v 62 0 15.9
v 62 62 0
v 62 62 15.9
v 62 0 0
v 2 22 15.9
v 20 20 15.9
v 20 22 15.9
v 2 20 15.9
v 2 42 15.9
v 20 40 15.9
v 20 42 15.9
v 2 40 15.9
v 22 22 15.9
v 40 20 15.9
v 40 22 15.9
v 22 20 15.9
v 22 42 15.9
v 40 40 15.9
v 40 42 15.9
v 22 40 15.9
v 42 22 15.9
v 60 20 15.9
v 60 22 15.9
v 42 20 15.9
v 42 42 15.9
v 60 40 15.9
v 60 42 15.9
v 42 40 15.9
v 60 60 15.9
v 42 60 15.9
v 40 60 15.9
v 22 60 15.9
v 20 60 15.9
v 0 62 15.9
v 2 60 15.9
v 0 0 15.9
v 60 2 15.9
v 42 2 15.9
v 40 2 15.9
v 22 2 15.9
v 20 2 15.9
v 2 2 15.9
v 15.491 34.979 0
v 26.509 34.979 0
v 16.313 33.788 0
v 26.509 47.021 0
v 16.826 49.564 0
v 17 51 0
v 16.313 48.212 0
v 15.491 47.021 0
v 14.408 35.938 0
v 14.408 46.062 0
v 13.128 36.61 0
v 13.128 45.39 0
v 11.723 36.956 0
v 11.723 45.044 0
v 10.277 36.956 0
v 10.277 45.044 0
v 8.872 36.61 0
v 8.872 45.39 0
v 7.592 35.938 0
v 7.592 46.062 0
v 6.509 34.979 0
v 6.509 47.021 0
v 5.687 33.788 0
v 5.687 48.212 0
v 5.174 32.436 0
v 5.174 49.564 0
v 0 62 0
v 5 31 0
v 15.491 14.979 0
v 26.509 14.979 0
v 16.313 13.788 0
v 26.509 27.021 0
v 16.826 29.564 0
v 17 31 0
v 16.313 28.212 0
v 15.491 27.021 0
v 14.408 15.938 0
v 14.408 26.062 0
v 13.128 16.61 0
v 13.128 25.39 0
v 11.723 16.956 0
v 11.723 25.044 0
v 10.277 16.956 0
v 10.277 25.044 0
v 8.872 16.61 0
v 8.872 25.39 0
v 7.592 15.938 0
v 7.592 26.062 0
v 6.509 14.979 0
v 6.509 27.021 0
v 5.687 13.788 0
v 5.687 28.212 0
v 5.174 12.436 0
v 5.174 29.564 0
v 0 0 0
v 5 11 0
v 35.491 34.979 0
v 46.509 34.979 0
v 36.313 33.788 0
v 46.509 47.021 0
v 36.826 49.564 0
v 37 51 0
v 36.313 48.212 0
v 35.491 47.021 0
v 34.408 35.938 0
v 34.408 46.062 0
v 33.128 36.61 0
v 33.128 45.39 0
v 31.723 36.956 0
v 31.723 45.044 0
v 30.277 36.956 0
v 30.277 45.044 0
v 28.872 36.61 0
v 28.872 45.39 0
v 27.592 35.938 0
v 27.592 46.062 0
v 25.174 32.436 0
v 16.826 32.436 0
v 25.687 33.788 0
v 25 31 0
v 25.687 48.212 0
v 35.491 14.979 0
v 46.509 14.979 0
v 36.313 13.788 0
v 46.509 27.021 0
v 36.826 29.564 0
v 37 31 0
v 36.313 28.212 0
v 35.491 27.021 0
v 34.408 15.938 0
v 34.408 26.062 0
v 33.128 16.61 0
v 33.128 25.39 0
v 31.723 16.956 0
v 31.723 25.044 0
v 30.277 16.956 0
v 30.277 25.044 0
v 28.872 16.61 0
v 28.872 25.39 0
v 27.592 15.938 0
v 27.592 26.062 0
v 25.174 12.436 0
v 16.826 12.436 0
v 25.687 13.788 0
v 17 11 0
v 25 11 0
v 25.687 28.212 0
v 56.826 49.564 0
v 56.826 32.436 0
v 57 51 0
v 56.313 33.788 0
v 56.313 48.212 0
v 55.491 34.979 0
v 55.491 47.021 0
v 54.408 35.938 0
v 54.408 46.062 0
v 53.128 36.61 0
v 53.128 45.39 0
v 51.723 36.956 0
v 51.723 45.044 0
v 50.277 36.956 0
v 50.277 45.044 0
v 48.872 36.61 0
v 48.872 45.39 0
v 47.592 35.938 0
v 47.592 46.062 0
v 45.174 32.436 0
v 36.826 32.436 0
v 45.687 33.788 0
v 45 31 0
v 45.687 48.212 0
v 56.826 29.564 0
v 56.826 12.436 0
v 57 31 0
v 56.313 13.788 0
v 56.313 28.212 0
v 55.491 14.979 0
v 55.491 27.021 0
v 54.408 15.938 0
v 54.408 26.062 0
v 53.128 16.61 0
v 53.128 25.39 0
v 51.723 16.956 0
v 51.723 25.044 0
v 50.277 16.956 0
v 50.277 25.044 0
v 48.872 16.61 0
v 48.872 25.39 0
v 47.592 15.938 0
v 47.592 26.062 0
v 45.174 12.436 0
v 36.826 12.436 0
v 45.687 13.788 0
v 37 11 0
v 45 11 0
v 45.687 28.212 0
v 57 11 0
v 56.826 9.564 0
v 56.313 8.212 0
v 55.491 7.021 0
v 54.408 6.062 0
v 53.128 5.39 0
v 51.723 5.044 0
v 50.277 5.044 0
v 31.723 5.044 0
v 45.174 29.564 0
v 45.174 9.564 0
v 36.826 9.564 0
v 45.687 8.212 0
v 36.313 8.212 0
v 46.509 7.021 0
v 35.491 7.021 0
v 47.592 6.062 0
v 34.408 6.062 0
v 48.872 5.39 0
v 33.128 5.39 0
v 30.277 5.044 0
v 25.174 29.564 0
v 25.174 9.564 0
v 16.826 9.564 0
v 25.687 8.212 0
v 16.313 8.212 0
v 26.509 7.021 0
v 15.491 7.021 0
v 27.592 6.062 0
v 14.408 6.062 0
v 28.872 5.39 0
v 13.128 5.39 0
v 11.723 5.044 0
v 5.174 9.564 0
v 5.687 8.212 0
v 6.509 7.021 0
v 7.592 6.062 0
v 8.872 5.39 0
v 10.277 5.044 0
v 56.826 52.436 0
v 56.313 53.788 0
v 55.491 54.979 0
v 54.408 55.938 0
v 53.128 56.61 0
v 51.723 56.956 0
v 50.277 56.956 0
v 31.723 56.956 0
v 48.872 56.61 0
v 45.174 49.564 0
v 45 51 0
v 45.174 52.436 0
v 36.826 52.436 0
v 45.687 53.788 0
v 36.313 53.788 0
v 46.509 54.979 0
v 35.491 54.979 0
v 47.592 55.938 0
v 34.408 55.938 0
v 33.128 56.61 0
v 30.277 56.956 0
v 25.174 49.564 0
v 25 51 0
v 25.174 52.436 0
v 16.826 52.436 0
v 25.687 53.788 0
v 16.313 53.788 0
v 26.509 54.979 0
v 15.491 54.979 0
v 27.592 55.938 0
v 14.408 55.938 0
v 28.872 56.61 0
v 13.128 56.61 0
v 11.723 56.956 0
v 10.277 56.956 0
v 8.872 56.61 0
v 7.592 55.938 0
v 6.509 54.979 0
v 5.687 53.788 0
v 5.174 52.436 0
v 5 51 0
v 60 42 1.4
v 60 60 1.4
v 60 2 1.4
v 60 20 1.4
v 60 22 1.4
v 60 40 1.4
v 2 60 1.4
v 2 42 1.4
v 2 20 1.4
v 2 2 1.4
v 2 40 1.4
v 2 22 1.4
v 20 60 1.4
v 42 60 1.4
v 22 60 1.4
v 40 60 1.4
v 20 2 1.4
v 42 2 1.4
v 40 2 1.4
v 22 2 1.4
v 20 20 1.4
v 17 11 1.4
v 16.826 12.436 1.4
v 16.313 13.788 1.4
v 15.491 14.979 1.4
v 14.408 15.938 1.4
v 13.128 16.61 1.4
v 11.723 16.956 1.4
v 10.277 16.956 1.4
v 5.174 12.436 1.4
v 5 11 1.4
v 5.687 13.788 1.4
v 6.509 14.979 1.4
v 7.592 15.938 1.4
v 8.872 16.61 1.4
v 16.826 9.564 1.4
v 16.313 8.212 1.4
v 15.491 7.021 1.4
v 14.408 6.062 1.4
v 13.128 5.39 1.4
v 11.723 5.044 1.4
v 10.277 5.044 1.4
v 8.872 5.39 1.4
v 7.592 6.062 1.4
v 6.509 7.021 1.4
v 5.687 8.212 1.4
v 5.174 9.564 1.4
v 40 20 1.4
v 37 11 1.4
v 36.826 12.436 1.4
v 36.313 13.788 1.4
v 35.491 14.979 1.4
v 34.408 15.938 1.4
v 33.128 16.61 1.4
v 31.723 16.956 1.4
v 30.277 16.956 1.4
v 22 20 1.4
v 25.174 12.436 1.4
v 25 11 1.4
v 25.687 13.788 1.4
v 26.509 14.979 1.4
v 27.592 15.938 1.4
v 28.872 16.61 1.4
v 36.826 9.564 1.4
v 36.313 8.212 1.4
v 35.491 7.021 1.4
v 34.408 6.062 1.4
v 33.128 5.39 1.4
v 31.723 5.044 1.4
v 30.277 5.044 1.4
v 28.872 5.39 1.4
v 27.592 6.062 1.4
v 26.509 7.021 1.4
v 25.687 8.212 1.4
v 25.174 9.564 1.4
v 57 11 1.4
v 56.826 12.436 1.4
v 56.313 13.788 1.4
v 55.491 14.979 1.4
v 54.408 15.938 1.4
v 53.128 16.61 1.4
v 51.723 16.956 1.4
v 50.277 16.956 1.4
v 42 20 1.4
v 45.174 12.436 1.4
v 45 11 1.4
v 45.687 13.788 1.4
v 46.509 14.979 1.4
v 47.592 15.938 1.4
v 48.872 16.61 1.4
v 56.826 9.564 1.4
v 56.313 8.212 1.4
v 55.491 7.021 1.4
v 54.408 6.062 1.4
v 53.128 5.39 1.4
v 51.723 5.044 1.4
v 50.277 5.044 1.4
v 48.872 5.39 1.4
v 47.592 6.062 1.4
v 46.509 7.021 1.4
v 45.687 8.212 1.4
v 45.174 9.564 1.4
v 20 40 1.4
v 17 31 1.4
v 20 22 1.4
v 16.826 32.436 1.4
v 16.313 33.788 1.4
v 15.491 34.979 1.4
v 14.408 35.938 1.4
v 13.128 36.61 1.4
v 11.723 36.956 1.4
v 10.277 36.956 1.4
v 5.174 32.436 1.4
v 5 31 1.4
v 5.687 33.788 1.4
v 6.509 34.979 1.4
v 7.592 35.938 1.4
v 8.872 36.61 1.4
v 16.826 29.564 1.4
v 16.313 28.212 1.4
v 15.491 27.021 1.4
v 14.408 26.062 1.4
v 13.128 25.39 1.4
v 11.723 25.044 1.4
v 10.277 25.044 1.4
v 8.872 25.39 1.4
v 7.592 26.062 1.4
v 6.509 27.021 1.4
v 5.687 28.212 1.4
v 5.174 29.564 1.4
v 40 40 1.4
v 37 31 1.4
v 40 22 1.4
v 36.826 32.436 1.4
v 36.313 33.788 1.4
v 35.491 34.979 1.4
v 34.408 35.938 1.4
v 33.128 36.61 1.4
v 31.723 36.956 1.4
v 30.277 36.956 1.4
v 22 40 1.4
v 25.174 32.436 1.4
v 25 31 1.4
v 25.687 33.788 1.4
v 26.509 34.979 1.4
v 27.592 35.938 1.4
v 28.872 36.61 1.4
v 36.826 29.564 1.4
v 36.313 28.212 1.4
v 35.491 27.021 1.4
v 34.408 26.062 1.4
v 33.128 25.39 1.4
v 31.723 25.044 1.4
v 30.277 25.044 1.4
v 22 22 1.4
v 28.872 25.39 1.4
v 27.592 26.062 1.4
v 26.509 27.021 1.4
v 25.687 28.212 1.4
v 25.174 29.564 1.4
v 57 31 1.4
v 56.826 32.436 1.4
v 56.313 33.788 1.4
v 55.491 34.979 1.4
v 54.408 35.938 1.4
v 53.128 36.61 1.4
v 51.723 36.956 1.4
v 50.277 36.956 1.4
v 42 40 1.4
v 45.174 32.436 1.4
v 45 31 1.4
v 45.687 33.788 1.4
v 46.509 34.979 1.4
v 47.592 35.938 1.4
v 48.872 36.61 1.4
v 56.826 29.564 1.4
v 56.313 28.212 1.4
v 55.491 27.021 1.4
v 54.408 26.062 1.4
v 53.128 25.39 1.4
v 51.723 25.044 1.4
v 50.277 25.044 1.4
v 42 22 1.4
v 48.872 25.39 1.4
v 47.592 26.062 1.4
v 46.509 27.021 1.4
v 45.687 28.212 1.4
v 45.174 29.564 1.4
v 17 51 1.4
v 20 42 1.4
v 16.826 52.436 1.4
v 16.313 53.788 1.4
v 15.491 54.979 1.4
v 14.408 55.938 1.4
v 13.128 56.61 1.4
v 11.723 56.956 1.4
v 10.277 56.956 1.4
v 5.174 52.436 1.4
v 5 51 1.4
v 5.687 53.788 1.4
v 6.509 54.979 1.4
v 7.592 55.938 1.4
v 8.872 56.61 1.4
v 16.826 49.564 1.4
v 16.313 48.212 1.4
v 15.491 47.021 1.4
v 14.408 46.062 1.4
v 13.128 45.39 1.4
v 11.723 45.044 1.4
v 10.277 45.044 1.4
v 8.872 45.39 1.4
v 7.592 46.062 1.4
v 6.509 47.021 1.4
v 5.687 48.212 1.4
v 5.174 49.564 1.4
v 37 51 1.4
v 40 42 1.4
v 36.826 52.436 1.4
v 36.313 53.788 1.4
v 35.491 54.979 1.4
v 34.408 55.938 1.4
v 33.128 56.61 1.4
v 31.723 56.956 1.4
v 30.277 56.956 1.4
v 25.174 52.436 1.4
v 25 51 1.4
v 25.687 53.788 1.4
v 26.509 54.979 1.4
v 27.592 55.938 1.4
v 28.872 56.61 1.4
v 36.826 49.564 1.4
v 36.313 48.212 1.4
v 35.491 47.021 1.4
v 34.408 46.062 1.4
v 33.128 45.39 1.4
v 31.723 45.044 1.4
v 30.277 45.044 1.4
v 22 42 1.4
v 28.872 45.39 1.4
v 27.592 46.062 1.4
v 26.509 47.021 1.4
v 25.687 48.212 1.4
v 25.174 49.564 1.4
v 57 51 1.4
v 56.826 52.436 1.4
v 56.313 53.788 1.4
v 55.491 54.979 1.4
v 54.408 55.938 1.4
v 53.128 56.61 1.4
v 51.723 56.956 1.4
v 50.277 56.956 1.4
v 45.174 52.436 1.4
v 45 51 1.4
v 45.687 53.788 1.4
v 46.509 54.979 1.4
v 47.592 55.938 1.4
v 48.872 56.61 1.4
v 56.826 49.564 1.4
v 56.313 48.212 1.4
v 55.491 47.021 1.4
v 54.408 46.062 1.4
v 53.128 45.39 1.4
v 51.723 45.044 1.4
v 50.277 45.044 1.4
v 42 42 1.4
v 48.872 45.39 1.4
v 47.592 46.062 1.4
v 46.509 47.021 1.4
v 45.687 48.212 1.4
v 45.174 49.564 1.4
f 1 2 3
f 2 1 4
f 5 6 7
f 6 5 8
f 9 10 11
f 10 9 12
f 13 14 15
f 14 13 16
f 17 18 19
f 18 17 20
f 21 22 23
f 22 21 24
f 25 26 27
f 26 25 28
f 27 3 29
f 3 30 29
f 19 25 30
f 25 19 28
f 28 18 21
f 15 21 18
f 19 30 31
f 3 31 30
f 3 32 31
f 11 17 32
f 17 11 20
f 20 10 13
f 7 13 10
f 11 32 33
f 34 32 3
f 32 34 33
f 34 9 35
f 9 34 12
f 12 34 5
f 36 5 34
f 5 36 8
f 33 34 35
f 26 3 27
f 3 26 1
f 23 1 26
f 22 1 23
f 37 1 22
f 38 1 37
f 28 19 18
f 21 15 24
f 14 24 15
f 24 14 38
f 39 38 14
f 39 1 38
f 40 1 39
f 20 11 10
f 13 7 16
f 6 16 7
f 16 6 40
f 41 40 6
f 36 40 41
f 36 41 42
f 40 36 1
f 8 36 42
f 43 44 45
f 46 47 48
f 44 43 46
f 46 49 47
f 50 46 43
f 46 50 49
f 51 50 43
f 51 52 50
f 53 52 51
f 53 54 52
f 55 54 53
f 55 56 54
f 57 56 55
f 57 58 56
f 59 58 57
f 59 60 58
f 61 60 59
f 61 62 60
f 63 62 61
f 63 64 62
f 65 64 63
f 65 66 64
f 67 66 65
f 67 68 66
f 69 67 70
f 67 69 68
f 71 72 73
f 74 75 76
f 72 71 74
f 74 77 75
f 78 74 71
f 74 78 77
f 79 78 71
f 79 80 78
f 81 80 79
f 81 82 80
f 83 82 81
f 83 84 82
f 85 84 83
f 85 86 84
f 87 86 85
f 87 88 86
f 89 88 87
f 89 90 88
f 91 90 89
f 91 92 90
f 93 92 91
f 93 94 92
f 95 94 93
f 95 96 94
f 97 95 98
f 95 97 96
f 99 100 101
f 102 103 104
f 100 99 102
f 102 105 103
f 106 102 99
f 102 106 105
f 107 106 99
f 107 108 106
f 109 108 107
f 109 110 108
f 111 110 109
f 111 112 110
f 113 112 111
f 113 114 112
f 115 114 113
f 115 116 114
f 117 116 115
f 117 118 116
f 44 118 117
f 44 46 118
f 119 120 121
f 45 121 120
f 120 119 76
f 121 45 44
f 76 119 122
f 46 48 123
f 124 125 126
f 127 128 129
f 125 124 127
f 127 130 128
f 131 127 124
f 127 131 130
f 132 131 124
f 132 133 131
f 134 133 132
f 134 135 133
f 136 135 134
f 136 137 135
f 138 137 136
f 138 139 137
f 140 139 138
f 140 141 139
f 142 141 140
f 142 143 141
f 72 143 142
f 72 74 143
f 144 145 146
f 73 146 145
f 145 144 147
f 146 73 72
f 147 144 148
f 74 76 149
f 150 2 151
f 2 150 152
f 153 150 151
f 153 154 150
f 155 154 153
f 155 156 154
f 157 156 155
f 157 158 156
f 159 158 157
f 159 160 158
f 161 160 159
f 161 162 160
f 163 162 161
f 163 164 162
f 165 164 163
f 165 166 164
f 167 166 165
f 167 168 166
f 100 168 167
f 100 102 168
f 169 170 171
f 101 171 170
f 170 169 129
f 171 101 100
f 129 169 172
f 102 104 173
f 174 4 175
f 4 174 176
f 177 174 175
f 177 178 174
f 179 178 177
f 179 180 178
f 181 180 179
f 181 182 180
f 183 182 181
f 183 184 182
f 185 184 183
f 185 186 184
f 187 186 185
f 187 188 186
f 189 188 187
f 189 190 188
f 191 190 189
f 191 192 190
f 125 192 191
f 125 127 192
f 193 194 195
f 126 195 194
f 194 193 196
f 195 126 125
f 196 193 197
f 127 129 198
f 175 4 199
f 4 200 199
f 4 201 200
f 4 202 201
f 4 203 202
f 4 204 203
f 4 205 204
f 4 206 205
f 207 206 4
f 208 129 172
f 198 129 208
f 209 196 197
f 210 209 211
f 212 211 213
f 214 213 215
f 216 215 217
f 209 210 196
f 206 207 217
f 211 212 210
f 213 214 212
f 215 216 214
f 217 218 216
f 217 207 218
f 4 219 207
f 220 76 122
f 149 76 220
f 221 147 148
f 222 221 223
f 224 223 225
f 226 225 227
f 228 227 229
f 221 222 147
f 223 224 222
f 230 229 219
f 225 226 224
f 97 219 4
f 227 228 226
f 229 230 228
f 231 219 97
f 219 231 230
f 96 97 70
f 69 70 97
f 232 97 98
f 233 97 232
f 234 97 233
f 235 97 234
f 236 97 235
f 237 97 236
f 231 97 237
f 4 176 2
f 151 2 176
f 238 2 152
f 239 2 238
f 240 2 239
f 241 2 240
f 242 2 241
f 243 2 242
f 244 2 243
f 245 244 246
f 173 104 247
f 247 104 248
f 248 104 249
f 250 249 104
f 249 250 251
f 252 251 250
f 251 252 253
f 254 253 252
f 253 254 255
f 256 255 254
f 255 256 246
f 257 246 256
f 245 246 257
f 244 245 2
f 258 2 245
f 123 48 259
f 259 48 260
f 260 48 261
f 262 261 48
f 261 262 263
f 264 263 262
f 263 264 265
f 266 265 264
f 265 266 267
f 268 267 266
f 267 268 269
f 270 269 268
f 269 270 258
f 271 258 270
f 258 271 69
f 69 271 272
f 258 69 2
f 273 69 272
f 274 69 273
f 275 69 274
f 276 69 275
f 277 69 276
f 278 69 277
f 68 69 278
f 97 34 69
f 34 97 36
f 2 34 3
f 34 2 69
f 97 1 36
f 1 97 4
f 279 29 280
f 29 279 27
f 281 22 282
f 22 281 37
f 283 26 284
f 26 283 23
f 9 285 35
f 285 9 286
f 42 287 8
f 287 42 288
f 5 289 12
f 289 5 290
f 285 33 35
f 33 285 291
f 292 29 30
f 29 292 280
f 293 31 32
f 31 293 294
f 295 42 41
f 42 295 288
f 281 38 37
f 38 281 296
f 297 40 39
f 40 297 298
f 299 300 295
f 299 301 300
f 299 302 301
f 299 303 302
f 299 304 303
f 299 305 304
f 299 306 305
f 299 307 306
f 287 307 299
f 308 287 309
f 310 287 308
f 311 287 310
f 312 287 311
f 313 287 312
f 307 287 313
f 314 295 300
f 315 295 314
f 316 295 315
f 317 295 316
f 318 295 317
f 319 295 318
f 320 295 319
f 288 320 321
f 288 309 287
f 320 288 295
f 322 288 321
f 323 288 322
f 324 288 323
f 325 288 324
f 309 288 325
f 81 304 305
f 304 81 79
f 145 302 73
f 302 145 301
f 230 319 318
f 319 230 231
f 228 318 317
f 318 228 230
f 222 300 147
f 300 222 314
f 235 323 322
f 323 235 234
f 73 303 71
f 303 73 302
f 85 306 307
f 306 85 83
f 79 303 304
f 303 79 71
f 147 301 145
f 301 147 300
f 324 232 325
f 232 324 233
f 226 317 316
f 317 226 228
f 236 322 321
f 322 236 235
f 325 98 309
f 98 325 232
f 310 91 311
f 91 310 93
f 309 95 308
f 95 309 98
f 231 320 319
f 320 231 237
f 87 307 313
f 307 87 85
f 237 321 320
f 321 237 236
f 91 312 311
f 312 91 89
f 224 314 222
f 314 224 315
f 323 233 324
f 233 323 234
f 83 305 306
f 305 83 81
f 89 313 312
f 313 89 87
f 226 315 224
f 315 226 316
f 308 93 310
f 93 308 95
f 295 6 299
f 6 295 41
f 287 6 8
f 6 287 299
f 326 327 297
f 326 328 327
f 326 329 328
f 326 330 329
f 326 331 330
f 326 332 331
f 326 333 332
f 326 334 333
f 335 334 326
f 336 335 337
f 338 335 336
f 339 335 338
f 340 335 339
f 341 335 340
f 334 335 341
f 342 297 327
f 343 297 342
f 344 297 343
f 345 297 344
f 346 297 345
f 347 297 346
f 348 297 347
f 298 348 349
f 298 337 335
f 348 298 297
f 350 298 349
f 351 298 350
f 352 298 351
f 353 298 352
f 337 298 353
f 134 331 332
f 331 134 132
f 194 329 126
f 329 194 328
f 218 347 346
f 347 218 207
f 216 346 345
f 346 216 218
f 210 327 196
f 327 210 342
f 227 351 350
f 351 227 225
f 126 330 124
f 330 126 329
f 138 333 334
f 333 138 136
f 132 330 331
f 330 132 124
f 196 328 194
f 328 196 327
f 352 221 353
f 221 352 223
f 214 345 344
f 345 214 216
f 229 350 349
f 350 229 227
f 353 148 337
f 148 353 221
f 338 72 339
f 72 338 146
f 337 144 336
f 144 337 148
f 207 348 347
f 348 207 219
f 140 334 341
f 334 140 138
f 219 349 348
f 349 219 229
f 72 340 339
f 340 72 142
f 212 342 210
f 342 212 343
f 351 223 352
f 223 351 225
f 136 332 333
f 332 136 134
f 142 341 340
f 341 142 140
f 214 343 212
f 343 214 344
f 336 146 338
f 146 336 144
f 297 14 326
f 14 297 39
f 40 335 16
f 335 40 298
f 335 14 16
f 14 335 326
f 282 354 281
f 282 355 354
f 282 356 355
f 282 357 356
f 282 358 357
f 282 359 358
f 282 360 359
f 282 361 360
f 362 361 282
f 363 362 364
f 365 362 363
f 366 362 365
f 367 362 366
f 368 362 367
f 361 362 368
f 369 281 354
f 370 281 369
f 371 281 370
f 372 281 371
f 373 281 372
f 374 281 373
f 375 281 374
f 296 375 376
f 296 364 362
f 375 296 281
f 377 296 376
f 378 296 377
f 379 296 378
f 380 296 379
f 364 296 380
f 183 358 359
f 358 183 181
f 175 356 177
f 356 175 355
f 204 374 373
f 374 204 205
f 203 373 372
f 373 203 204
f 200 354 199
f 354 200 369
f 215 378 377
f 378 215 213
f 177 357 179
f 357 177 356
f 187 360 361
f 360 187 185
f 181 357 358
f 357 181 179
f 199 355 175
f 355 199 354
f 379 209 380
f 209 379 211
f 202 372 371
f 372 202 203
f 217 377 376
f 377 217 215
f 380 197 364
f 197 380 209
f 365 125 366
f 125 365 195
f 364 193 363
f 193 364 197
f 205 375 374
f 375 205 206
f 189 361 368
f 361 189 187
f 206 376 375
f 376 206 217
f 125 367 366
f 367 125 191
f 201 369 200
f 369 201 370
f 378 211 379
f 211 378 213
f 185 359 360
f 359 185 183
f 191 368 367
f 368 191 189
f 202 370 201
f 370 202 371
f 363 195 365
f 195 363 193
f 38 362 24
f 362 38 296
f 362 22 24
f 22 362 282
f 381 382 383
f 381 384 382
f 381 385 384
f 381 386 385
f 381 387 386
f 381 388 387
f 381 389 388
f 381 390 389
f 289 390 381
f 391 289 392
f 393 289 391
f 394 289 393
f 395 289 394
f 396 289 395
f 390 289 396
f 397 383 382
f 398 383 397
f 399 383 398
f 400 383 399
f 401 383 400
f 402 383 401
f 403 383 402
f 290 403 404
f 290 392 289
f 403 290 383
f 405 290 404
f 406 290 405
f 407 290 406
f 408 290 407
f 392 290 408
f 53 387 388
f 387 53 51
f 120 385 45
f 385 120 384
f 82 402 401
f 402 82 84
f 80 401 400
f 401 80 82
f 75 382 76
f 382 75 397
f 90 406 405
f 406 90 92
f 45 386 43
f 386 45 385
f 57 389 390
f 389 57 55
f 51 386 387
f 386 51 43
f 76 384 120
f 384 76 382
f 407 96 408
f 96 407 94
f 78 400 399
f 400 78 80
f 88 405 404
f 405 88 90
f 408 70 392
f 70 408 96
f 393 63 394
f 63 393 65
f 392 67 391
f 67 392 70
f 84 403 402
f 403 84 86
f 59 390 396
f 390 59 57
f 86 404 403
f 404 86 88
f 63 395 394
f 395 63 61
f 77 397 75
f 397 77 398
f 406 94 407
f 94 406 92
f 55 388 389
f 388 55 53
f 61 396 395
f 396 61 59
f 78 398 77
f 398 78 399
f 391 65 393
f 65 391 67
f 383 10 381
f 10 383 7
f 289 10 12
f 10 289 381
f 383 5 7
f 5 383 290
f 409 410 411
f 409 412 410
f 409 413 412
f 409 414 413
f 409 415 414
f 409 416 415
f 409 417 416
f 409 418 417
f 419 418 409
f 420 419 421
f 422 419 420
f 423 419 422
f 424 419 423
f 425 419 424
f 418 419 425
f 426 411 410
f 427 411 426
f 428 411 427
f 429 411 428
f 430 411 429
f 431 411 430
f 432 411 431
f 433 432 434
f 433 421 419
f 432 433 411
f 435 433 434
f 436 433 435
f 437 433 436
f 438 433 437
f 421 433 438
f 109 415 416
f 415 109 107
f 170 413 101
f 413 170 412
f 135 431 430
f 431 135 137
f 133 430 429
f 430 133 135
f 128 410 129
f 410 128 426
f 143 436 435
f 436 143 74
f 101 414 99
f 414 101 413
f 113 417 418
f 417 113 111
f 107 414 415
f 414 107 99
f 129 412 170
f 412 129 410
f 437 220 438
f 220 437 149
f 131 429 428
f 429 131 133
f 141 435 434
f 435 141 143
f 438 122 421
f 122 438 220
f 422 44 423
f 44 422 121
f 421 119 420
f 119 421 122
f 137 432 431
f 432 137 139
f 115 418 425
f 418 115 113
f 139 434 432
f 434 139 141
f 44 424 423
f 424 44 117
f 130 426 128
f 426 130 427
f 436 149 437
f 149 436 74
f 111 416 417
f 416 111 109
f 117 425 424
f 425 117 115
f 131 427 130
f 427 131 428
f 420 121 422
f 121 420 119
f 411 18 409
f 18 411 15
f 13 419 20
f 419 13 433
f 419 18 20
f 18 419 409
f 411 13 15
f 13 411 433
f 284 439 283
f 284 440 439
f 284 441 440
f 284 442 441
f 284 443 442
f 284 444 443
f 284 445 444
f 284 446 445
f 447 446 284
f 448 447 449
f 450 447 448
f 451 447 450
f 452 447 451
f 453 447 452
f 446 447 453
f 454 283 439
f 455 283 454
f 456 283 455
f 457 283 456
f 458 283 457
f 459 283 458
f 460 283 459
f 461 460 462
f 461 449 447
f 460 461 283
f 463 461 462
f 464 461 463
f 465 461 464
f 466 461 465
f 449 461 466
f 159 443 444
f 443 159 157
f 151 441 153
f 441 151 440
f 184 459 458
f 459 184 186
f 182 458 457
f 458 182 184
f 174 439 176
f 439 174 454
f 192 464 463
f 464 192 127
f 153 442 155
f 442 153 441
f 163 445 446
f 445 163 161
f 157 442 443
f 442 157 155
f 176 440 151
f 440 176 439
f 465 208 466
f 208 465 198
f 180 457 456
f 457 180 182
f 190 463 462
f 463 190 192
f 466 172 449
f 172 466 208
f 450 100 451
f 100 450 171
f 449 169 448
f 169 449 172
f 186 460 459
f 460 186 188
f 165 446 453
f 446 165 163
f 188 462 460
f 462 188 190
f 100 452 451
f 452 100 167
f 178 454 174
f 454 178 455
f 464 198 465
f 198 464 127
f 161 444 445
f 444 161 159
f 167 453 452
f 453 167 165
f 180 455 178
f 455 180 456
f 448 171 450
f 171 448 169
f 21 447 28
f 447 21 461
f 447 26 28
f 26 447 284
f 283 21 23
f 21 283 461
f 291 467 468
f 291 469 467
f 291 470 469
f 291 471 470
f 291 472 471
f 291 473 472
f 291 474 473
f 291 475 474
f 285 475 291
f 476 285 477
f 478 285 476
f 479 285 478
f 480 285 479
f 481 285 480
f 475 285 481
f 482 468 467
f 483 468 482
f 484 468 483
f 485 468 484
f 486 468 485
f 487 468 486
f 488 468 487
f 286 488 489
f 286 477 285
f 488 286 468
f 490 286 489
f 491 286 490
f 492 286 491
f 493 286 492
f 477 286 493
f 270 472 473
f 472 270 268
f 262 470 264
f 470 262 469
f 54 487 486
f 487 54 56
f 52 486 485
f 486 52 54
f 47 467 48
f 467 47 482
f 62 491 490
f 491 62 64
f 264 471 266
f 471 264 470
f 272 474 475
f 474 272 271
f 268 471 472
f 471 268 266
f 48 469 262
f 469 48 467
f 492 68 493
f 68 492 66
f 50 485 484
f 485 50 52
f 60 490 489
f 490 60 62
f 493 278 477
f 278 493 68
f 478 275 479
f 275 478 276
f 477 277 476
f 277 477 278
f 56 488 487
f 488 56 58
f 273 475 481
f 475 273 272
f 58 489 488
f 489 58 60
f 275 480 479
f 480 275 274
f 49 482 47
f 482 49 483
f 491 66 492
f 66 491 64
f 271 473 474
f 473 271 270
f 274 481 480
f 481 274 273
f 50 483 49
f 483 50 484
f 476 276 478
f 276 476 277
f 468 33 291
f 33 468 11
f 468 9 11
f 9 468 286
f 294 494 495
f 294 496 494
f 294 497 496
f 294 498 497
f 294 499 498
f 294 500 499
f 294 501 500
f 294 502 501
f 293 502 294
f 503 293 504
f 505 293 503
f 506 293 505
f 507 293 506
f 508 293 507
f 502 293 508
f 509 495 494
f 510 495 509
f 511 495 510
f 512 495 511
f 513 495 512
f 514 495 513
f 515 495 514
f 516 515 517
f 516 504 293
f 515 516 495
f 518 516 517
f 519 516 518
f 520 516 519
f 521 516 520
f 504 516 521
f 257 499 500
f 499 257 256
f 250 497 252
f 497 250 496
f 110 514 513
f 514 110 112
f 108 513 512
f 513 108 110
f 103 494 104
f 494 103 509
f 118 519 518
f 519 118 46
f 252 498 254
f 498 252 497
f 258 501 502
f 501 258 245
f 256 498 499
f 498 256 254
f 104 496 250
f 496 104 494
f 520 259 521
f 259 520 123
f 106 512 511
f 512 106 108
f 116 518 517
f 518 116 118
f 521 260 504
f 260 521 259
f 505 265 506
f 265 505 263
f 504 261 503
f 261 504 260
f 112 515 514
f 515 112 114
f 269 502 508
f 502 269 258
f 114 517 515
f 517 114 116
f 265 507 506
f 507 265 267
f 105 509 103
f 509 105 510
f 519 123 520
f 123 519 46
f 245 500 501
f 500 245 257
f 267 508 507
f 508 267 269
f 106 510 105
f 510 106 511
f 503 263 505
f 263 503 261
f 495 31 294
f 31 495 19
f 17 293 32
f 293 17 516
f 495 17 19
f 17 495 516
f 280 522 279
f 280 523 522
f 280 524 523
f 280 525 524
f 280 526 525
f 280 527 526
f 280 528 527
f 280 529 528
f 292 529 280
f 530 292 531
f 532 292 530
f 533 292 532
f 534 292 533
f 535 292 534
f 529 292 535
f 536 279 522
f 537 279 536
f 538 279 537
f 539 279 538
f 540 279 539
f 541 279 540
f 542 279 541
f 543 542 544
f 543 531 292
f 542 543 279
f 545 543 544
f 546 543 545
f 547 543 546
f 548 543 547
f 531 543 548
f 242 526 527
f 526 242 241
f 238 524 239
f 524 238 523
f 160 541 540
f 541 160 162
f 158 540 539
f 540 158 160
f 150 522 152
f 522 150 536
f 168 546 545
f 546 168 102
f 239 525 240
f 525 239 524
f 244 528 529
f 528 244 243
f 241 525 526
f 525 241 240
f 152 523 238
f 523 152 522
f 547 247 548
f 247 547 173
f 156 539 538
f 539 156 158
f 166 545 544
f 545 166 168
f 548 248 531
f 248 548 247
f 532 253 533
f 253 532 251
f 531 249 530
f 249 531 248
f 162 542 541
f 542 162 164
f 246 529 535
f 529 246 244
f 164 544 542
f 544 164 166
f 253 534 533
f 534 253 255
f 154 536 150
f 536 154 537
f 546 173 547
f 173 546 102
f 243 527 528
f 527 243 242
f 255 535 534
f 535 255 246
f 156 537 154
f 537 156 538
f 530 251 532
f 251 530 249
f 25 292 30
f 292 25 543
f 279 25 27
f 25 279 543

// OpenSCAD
// CSG.scad - Basic example of CSG usage
$fa = 2;
$fs = 1.5;

side = 20;
half_side = side / 2;
height = 1.4;
hole_diameter = 12;

wall_height = height + 14.5;
wall_width = 1;

outer_wall_height = wall_height;
outer_wall_thickness = wall_width * 2;

cylinder_diameter = 8;
cylinder_height = height * 3;


grid_size = 3;

// outer walls
difference() {
    // color("green")
    cube([
        grid_size * side + outer_wall_thickness,
        grid_size * side + outer_wall_thickness,
        outer_wall_height
    ]);
    translate([outer_wall_thickness, outer_wall_thickness, -(outer_wall_height * .5)])
        cube([
            grid_size * side - outer_wall_thickness,
            grid_size * side - outer_wall_thickness,
            outer_wall_height * 2
        ]);
}

// grid
translate([wall_width, wall_width, 0]) {
for (y = [0:grid_size - 1])
for (x = [0:grid_size - 1])
translate([x * side, y * side, 0]) {
    // bottom plate with hole
    difference() {
        color("red")
        cube([side,side,height]);
        translate([half_side, half_side, -(height * .5)]) {
            cylinder(h = height * 2, d = hole_diameter);
        }
    }

    // // walls
    difference() {
        cube([side, side, wall_height]);
        translate([wall_width, wall_width, - (wall_height * .5)]) {
            cube([
                (side - (2 * wall_width)),
                (side - (2 * wall_width)),
                wall_height * 3
            ]);
        }
    }
}

}
